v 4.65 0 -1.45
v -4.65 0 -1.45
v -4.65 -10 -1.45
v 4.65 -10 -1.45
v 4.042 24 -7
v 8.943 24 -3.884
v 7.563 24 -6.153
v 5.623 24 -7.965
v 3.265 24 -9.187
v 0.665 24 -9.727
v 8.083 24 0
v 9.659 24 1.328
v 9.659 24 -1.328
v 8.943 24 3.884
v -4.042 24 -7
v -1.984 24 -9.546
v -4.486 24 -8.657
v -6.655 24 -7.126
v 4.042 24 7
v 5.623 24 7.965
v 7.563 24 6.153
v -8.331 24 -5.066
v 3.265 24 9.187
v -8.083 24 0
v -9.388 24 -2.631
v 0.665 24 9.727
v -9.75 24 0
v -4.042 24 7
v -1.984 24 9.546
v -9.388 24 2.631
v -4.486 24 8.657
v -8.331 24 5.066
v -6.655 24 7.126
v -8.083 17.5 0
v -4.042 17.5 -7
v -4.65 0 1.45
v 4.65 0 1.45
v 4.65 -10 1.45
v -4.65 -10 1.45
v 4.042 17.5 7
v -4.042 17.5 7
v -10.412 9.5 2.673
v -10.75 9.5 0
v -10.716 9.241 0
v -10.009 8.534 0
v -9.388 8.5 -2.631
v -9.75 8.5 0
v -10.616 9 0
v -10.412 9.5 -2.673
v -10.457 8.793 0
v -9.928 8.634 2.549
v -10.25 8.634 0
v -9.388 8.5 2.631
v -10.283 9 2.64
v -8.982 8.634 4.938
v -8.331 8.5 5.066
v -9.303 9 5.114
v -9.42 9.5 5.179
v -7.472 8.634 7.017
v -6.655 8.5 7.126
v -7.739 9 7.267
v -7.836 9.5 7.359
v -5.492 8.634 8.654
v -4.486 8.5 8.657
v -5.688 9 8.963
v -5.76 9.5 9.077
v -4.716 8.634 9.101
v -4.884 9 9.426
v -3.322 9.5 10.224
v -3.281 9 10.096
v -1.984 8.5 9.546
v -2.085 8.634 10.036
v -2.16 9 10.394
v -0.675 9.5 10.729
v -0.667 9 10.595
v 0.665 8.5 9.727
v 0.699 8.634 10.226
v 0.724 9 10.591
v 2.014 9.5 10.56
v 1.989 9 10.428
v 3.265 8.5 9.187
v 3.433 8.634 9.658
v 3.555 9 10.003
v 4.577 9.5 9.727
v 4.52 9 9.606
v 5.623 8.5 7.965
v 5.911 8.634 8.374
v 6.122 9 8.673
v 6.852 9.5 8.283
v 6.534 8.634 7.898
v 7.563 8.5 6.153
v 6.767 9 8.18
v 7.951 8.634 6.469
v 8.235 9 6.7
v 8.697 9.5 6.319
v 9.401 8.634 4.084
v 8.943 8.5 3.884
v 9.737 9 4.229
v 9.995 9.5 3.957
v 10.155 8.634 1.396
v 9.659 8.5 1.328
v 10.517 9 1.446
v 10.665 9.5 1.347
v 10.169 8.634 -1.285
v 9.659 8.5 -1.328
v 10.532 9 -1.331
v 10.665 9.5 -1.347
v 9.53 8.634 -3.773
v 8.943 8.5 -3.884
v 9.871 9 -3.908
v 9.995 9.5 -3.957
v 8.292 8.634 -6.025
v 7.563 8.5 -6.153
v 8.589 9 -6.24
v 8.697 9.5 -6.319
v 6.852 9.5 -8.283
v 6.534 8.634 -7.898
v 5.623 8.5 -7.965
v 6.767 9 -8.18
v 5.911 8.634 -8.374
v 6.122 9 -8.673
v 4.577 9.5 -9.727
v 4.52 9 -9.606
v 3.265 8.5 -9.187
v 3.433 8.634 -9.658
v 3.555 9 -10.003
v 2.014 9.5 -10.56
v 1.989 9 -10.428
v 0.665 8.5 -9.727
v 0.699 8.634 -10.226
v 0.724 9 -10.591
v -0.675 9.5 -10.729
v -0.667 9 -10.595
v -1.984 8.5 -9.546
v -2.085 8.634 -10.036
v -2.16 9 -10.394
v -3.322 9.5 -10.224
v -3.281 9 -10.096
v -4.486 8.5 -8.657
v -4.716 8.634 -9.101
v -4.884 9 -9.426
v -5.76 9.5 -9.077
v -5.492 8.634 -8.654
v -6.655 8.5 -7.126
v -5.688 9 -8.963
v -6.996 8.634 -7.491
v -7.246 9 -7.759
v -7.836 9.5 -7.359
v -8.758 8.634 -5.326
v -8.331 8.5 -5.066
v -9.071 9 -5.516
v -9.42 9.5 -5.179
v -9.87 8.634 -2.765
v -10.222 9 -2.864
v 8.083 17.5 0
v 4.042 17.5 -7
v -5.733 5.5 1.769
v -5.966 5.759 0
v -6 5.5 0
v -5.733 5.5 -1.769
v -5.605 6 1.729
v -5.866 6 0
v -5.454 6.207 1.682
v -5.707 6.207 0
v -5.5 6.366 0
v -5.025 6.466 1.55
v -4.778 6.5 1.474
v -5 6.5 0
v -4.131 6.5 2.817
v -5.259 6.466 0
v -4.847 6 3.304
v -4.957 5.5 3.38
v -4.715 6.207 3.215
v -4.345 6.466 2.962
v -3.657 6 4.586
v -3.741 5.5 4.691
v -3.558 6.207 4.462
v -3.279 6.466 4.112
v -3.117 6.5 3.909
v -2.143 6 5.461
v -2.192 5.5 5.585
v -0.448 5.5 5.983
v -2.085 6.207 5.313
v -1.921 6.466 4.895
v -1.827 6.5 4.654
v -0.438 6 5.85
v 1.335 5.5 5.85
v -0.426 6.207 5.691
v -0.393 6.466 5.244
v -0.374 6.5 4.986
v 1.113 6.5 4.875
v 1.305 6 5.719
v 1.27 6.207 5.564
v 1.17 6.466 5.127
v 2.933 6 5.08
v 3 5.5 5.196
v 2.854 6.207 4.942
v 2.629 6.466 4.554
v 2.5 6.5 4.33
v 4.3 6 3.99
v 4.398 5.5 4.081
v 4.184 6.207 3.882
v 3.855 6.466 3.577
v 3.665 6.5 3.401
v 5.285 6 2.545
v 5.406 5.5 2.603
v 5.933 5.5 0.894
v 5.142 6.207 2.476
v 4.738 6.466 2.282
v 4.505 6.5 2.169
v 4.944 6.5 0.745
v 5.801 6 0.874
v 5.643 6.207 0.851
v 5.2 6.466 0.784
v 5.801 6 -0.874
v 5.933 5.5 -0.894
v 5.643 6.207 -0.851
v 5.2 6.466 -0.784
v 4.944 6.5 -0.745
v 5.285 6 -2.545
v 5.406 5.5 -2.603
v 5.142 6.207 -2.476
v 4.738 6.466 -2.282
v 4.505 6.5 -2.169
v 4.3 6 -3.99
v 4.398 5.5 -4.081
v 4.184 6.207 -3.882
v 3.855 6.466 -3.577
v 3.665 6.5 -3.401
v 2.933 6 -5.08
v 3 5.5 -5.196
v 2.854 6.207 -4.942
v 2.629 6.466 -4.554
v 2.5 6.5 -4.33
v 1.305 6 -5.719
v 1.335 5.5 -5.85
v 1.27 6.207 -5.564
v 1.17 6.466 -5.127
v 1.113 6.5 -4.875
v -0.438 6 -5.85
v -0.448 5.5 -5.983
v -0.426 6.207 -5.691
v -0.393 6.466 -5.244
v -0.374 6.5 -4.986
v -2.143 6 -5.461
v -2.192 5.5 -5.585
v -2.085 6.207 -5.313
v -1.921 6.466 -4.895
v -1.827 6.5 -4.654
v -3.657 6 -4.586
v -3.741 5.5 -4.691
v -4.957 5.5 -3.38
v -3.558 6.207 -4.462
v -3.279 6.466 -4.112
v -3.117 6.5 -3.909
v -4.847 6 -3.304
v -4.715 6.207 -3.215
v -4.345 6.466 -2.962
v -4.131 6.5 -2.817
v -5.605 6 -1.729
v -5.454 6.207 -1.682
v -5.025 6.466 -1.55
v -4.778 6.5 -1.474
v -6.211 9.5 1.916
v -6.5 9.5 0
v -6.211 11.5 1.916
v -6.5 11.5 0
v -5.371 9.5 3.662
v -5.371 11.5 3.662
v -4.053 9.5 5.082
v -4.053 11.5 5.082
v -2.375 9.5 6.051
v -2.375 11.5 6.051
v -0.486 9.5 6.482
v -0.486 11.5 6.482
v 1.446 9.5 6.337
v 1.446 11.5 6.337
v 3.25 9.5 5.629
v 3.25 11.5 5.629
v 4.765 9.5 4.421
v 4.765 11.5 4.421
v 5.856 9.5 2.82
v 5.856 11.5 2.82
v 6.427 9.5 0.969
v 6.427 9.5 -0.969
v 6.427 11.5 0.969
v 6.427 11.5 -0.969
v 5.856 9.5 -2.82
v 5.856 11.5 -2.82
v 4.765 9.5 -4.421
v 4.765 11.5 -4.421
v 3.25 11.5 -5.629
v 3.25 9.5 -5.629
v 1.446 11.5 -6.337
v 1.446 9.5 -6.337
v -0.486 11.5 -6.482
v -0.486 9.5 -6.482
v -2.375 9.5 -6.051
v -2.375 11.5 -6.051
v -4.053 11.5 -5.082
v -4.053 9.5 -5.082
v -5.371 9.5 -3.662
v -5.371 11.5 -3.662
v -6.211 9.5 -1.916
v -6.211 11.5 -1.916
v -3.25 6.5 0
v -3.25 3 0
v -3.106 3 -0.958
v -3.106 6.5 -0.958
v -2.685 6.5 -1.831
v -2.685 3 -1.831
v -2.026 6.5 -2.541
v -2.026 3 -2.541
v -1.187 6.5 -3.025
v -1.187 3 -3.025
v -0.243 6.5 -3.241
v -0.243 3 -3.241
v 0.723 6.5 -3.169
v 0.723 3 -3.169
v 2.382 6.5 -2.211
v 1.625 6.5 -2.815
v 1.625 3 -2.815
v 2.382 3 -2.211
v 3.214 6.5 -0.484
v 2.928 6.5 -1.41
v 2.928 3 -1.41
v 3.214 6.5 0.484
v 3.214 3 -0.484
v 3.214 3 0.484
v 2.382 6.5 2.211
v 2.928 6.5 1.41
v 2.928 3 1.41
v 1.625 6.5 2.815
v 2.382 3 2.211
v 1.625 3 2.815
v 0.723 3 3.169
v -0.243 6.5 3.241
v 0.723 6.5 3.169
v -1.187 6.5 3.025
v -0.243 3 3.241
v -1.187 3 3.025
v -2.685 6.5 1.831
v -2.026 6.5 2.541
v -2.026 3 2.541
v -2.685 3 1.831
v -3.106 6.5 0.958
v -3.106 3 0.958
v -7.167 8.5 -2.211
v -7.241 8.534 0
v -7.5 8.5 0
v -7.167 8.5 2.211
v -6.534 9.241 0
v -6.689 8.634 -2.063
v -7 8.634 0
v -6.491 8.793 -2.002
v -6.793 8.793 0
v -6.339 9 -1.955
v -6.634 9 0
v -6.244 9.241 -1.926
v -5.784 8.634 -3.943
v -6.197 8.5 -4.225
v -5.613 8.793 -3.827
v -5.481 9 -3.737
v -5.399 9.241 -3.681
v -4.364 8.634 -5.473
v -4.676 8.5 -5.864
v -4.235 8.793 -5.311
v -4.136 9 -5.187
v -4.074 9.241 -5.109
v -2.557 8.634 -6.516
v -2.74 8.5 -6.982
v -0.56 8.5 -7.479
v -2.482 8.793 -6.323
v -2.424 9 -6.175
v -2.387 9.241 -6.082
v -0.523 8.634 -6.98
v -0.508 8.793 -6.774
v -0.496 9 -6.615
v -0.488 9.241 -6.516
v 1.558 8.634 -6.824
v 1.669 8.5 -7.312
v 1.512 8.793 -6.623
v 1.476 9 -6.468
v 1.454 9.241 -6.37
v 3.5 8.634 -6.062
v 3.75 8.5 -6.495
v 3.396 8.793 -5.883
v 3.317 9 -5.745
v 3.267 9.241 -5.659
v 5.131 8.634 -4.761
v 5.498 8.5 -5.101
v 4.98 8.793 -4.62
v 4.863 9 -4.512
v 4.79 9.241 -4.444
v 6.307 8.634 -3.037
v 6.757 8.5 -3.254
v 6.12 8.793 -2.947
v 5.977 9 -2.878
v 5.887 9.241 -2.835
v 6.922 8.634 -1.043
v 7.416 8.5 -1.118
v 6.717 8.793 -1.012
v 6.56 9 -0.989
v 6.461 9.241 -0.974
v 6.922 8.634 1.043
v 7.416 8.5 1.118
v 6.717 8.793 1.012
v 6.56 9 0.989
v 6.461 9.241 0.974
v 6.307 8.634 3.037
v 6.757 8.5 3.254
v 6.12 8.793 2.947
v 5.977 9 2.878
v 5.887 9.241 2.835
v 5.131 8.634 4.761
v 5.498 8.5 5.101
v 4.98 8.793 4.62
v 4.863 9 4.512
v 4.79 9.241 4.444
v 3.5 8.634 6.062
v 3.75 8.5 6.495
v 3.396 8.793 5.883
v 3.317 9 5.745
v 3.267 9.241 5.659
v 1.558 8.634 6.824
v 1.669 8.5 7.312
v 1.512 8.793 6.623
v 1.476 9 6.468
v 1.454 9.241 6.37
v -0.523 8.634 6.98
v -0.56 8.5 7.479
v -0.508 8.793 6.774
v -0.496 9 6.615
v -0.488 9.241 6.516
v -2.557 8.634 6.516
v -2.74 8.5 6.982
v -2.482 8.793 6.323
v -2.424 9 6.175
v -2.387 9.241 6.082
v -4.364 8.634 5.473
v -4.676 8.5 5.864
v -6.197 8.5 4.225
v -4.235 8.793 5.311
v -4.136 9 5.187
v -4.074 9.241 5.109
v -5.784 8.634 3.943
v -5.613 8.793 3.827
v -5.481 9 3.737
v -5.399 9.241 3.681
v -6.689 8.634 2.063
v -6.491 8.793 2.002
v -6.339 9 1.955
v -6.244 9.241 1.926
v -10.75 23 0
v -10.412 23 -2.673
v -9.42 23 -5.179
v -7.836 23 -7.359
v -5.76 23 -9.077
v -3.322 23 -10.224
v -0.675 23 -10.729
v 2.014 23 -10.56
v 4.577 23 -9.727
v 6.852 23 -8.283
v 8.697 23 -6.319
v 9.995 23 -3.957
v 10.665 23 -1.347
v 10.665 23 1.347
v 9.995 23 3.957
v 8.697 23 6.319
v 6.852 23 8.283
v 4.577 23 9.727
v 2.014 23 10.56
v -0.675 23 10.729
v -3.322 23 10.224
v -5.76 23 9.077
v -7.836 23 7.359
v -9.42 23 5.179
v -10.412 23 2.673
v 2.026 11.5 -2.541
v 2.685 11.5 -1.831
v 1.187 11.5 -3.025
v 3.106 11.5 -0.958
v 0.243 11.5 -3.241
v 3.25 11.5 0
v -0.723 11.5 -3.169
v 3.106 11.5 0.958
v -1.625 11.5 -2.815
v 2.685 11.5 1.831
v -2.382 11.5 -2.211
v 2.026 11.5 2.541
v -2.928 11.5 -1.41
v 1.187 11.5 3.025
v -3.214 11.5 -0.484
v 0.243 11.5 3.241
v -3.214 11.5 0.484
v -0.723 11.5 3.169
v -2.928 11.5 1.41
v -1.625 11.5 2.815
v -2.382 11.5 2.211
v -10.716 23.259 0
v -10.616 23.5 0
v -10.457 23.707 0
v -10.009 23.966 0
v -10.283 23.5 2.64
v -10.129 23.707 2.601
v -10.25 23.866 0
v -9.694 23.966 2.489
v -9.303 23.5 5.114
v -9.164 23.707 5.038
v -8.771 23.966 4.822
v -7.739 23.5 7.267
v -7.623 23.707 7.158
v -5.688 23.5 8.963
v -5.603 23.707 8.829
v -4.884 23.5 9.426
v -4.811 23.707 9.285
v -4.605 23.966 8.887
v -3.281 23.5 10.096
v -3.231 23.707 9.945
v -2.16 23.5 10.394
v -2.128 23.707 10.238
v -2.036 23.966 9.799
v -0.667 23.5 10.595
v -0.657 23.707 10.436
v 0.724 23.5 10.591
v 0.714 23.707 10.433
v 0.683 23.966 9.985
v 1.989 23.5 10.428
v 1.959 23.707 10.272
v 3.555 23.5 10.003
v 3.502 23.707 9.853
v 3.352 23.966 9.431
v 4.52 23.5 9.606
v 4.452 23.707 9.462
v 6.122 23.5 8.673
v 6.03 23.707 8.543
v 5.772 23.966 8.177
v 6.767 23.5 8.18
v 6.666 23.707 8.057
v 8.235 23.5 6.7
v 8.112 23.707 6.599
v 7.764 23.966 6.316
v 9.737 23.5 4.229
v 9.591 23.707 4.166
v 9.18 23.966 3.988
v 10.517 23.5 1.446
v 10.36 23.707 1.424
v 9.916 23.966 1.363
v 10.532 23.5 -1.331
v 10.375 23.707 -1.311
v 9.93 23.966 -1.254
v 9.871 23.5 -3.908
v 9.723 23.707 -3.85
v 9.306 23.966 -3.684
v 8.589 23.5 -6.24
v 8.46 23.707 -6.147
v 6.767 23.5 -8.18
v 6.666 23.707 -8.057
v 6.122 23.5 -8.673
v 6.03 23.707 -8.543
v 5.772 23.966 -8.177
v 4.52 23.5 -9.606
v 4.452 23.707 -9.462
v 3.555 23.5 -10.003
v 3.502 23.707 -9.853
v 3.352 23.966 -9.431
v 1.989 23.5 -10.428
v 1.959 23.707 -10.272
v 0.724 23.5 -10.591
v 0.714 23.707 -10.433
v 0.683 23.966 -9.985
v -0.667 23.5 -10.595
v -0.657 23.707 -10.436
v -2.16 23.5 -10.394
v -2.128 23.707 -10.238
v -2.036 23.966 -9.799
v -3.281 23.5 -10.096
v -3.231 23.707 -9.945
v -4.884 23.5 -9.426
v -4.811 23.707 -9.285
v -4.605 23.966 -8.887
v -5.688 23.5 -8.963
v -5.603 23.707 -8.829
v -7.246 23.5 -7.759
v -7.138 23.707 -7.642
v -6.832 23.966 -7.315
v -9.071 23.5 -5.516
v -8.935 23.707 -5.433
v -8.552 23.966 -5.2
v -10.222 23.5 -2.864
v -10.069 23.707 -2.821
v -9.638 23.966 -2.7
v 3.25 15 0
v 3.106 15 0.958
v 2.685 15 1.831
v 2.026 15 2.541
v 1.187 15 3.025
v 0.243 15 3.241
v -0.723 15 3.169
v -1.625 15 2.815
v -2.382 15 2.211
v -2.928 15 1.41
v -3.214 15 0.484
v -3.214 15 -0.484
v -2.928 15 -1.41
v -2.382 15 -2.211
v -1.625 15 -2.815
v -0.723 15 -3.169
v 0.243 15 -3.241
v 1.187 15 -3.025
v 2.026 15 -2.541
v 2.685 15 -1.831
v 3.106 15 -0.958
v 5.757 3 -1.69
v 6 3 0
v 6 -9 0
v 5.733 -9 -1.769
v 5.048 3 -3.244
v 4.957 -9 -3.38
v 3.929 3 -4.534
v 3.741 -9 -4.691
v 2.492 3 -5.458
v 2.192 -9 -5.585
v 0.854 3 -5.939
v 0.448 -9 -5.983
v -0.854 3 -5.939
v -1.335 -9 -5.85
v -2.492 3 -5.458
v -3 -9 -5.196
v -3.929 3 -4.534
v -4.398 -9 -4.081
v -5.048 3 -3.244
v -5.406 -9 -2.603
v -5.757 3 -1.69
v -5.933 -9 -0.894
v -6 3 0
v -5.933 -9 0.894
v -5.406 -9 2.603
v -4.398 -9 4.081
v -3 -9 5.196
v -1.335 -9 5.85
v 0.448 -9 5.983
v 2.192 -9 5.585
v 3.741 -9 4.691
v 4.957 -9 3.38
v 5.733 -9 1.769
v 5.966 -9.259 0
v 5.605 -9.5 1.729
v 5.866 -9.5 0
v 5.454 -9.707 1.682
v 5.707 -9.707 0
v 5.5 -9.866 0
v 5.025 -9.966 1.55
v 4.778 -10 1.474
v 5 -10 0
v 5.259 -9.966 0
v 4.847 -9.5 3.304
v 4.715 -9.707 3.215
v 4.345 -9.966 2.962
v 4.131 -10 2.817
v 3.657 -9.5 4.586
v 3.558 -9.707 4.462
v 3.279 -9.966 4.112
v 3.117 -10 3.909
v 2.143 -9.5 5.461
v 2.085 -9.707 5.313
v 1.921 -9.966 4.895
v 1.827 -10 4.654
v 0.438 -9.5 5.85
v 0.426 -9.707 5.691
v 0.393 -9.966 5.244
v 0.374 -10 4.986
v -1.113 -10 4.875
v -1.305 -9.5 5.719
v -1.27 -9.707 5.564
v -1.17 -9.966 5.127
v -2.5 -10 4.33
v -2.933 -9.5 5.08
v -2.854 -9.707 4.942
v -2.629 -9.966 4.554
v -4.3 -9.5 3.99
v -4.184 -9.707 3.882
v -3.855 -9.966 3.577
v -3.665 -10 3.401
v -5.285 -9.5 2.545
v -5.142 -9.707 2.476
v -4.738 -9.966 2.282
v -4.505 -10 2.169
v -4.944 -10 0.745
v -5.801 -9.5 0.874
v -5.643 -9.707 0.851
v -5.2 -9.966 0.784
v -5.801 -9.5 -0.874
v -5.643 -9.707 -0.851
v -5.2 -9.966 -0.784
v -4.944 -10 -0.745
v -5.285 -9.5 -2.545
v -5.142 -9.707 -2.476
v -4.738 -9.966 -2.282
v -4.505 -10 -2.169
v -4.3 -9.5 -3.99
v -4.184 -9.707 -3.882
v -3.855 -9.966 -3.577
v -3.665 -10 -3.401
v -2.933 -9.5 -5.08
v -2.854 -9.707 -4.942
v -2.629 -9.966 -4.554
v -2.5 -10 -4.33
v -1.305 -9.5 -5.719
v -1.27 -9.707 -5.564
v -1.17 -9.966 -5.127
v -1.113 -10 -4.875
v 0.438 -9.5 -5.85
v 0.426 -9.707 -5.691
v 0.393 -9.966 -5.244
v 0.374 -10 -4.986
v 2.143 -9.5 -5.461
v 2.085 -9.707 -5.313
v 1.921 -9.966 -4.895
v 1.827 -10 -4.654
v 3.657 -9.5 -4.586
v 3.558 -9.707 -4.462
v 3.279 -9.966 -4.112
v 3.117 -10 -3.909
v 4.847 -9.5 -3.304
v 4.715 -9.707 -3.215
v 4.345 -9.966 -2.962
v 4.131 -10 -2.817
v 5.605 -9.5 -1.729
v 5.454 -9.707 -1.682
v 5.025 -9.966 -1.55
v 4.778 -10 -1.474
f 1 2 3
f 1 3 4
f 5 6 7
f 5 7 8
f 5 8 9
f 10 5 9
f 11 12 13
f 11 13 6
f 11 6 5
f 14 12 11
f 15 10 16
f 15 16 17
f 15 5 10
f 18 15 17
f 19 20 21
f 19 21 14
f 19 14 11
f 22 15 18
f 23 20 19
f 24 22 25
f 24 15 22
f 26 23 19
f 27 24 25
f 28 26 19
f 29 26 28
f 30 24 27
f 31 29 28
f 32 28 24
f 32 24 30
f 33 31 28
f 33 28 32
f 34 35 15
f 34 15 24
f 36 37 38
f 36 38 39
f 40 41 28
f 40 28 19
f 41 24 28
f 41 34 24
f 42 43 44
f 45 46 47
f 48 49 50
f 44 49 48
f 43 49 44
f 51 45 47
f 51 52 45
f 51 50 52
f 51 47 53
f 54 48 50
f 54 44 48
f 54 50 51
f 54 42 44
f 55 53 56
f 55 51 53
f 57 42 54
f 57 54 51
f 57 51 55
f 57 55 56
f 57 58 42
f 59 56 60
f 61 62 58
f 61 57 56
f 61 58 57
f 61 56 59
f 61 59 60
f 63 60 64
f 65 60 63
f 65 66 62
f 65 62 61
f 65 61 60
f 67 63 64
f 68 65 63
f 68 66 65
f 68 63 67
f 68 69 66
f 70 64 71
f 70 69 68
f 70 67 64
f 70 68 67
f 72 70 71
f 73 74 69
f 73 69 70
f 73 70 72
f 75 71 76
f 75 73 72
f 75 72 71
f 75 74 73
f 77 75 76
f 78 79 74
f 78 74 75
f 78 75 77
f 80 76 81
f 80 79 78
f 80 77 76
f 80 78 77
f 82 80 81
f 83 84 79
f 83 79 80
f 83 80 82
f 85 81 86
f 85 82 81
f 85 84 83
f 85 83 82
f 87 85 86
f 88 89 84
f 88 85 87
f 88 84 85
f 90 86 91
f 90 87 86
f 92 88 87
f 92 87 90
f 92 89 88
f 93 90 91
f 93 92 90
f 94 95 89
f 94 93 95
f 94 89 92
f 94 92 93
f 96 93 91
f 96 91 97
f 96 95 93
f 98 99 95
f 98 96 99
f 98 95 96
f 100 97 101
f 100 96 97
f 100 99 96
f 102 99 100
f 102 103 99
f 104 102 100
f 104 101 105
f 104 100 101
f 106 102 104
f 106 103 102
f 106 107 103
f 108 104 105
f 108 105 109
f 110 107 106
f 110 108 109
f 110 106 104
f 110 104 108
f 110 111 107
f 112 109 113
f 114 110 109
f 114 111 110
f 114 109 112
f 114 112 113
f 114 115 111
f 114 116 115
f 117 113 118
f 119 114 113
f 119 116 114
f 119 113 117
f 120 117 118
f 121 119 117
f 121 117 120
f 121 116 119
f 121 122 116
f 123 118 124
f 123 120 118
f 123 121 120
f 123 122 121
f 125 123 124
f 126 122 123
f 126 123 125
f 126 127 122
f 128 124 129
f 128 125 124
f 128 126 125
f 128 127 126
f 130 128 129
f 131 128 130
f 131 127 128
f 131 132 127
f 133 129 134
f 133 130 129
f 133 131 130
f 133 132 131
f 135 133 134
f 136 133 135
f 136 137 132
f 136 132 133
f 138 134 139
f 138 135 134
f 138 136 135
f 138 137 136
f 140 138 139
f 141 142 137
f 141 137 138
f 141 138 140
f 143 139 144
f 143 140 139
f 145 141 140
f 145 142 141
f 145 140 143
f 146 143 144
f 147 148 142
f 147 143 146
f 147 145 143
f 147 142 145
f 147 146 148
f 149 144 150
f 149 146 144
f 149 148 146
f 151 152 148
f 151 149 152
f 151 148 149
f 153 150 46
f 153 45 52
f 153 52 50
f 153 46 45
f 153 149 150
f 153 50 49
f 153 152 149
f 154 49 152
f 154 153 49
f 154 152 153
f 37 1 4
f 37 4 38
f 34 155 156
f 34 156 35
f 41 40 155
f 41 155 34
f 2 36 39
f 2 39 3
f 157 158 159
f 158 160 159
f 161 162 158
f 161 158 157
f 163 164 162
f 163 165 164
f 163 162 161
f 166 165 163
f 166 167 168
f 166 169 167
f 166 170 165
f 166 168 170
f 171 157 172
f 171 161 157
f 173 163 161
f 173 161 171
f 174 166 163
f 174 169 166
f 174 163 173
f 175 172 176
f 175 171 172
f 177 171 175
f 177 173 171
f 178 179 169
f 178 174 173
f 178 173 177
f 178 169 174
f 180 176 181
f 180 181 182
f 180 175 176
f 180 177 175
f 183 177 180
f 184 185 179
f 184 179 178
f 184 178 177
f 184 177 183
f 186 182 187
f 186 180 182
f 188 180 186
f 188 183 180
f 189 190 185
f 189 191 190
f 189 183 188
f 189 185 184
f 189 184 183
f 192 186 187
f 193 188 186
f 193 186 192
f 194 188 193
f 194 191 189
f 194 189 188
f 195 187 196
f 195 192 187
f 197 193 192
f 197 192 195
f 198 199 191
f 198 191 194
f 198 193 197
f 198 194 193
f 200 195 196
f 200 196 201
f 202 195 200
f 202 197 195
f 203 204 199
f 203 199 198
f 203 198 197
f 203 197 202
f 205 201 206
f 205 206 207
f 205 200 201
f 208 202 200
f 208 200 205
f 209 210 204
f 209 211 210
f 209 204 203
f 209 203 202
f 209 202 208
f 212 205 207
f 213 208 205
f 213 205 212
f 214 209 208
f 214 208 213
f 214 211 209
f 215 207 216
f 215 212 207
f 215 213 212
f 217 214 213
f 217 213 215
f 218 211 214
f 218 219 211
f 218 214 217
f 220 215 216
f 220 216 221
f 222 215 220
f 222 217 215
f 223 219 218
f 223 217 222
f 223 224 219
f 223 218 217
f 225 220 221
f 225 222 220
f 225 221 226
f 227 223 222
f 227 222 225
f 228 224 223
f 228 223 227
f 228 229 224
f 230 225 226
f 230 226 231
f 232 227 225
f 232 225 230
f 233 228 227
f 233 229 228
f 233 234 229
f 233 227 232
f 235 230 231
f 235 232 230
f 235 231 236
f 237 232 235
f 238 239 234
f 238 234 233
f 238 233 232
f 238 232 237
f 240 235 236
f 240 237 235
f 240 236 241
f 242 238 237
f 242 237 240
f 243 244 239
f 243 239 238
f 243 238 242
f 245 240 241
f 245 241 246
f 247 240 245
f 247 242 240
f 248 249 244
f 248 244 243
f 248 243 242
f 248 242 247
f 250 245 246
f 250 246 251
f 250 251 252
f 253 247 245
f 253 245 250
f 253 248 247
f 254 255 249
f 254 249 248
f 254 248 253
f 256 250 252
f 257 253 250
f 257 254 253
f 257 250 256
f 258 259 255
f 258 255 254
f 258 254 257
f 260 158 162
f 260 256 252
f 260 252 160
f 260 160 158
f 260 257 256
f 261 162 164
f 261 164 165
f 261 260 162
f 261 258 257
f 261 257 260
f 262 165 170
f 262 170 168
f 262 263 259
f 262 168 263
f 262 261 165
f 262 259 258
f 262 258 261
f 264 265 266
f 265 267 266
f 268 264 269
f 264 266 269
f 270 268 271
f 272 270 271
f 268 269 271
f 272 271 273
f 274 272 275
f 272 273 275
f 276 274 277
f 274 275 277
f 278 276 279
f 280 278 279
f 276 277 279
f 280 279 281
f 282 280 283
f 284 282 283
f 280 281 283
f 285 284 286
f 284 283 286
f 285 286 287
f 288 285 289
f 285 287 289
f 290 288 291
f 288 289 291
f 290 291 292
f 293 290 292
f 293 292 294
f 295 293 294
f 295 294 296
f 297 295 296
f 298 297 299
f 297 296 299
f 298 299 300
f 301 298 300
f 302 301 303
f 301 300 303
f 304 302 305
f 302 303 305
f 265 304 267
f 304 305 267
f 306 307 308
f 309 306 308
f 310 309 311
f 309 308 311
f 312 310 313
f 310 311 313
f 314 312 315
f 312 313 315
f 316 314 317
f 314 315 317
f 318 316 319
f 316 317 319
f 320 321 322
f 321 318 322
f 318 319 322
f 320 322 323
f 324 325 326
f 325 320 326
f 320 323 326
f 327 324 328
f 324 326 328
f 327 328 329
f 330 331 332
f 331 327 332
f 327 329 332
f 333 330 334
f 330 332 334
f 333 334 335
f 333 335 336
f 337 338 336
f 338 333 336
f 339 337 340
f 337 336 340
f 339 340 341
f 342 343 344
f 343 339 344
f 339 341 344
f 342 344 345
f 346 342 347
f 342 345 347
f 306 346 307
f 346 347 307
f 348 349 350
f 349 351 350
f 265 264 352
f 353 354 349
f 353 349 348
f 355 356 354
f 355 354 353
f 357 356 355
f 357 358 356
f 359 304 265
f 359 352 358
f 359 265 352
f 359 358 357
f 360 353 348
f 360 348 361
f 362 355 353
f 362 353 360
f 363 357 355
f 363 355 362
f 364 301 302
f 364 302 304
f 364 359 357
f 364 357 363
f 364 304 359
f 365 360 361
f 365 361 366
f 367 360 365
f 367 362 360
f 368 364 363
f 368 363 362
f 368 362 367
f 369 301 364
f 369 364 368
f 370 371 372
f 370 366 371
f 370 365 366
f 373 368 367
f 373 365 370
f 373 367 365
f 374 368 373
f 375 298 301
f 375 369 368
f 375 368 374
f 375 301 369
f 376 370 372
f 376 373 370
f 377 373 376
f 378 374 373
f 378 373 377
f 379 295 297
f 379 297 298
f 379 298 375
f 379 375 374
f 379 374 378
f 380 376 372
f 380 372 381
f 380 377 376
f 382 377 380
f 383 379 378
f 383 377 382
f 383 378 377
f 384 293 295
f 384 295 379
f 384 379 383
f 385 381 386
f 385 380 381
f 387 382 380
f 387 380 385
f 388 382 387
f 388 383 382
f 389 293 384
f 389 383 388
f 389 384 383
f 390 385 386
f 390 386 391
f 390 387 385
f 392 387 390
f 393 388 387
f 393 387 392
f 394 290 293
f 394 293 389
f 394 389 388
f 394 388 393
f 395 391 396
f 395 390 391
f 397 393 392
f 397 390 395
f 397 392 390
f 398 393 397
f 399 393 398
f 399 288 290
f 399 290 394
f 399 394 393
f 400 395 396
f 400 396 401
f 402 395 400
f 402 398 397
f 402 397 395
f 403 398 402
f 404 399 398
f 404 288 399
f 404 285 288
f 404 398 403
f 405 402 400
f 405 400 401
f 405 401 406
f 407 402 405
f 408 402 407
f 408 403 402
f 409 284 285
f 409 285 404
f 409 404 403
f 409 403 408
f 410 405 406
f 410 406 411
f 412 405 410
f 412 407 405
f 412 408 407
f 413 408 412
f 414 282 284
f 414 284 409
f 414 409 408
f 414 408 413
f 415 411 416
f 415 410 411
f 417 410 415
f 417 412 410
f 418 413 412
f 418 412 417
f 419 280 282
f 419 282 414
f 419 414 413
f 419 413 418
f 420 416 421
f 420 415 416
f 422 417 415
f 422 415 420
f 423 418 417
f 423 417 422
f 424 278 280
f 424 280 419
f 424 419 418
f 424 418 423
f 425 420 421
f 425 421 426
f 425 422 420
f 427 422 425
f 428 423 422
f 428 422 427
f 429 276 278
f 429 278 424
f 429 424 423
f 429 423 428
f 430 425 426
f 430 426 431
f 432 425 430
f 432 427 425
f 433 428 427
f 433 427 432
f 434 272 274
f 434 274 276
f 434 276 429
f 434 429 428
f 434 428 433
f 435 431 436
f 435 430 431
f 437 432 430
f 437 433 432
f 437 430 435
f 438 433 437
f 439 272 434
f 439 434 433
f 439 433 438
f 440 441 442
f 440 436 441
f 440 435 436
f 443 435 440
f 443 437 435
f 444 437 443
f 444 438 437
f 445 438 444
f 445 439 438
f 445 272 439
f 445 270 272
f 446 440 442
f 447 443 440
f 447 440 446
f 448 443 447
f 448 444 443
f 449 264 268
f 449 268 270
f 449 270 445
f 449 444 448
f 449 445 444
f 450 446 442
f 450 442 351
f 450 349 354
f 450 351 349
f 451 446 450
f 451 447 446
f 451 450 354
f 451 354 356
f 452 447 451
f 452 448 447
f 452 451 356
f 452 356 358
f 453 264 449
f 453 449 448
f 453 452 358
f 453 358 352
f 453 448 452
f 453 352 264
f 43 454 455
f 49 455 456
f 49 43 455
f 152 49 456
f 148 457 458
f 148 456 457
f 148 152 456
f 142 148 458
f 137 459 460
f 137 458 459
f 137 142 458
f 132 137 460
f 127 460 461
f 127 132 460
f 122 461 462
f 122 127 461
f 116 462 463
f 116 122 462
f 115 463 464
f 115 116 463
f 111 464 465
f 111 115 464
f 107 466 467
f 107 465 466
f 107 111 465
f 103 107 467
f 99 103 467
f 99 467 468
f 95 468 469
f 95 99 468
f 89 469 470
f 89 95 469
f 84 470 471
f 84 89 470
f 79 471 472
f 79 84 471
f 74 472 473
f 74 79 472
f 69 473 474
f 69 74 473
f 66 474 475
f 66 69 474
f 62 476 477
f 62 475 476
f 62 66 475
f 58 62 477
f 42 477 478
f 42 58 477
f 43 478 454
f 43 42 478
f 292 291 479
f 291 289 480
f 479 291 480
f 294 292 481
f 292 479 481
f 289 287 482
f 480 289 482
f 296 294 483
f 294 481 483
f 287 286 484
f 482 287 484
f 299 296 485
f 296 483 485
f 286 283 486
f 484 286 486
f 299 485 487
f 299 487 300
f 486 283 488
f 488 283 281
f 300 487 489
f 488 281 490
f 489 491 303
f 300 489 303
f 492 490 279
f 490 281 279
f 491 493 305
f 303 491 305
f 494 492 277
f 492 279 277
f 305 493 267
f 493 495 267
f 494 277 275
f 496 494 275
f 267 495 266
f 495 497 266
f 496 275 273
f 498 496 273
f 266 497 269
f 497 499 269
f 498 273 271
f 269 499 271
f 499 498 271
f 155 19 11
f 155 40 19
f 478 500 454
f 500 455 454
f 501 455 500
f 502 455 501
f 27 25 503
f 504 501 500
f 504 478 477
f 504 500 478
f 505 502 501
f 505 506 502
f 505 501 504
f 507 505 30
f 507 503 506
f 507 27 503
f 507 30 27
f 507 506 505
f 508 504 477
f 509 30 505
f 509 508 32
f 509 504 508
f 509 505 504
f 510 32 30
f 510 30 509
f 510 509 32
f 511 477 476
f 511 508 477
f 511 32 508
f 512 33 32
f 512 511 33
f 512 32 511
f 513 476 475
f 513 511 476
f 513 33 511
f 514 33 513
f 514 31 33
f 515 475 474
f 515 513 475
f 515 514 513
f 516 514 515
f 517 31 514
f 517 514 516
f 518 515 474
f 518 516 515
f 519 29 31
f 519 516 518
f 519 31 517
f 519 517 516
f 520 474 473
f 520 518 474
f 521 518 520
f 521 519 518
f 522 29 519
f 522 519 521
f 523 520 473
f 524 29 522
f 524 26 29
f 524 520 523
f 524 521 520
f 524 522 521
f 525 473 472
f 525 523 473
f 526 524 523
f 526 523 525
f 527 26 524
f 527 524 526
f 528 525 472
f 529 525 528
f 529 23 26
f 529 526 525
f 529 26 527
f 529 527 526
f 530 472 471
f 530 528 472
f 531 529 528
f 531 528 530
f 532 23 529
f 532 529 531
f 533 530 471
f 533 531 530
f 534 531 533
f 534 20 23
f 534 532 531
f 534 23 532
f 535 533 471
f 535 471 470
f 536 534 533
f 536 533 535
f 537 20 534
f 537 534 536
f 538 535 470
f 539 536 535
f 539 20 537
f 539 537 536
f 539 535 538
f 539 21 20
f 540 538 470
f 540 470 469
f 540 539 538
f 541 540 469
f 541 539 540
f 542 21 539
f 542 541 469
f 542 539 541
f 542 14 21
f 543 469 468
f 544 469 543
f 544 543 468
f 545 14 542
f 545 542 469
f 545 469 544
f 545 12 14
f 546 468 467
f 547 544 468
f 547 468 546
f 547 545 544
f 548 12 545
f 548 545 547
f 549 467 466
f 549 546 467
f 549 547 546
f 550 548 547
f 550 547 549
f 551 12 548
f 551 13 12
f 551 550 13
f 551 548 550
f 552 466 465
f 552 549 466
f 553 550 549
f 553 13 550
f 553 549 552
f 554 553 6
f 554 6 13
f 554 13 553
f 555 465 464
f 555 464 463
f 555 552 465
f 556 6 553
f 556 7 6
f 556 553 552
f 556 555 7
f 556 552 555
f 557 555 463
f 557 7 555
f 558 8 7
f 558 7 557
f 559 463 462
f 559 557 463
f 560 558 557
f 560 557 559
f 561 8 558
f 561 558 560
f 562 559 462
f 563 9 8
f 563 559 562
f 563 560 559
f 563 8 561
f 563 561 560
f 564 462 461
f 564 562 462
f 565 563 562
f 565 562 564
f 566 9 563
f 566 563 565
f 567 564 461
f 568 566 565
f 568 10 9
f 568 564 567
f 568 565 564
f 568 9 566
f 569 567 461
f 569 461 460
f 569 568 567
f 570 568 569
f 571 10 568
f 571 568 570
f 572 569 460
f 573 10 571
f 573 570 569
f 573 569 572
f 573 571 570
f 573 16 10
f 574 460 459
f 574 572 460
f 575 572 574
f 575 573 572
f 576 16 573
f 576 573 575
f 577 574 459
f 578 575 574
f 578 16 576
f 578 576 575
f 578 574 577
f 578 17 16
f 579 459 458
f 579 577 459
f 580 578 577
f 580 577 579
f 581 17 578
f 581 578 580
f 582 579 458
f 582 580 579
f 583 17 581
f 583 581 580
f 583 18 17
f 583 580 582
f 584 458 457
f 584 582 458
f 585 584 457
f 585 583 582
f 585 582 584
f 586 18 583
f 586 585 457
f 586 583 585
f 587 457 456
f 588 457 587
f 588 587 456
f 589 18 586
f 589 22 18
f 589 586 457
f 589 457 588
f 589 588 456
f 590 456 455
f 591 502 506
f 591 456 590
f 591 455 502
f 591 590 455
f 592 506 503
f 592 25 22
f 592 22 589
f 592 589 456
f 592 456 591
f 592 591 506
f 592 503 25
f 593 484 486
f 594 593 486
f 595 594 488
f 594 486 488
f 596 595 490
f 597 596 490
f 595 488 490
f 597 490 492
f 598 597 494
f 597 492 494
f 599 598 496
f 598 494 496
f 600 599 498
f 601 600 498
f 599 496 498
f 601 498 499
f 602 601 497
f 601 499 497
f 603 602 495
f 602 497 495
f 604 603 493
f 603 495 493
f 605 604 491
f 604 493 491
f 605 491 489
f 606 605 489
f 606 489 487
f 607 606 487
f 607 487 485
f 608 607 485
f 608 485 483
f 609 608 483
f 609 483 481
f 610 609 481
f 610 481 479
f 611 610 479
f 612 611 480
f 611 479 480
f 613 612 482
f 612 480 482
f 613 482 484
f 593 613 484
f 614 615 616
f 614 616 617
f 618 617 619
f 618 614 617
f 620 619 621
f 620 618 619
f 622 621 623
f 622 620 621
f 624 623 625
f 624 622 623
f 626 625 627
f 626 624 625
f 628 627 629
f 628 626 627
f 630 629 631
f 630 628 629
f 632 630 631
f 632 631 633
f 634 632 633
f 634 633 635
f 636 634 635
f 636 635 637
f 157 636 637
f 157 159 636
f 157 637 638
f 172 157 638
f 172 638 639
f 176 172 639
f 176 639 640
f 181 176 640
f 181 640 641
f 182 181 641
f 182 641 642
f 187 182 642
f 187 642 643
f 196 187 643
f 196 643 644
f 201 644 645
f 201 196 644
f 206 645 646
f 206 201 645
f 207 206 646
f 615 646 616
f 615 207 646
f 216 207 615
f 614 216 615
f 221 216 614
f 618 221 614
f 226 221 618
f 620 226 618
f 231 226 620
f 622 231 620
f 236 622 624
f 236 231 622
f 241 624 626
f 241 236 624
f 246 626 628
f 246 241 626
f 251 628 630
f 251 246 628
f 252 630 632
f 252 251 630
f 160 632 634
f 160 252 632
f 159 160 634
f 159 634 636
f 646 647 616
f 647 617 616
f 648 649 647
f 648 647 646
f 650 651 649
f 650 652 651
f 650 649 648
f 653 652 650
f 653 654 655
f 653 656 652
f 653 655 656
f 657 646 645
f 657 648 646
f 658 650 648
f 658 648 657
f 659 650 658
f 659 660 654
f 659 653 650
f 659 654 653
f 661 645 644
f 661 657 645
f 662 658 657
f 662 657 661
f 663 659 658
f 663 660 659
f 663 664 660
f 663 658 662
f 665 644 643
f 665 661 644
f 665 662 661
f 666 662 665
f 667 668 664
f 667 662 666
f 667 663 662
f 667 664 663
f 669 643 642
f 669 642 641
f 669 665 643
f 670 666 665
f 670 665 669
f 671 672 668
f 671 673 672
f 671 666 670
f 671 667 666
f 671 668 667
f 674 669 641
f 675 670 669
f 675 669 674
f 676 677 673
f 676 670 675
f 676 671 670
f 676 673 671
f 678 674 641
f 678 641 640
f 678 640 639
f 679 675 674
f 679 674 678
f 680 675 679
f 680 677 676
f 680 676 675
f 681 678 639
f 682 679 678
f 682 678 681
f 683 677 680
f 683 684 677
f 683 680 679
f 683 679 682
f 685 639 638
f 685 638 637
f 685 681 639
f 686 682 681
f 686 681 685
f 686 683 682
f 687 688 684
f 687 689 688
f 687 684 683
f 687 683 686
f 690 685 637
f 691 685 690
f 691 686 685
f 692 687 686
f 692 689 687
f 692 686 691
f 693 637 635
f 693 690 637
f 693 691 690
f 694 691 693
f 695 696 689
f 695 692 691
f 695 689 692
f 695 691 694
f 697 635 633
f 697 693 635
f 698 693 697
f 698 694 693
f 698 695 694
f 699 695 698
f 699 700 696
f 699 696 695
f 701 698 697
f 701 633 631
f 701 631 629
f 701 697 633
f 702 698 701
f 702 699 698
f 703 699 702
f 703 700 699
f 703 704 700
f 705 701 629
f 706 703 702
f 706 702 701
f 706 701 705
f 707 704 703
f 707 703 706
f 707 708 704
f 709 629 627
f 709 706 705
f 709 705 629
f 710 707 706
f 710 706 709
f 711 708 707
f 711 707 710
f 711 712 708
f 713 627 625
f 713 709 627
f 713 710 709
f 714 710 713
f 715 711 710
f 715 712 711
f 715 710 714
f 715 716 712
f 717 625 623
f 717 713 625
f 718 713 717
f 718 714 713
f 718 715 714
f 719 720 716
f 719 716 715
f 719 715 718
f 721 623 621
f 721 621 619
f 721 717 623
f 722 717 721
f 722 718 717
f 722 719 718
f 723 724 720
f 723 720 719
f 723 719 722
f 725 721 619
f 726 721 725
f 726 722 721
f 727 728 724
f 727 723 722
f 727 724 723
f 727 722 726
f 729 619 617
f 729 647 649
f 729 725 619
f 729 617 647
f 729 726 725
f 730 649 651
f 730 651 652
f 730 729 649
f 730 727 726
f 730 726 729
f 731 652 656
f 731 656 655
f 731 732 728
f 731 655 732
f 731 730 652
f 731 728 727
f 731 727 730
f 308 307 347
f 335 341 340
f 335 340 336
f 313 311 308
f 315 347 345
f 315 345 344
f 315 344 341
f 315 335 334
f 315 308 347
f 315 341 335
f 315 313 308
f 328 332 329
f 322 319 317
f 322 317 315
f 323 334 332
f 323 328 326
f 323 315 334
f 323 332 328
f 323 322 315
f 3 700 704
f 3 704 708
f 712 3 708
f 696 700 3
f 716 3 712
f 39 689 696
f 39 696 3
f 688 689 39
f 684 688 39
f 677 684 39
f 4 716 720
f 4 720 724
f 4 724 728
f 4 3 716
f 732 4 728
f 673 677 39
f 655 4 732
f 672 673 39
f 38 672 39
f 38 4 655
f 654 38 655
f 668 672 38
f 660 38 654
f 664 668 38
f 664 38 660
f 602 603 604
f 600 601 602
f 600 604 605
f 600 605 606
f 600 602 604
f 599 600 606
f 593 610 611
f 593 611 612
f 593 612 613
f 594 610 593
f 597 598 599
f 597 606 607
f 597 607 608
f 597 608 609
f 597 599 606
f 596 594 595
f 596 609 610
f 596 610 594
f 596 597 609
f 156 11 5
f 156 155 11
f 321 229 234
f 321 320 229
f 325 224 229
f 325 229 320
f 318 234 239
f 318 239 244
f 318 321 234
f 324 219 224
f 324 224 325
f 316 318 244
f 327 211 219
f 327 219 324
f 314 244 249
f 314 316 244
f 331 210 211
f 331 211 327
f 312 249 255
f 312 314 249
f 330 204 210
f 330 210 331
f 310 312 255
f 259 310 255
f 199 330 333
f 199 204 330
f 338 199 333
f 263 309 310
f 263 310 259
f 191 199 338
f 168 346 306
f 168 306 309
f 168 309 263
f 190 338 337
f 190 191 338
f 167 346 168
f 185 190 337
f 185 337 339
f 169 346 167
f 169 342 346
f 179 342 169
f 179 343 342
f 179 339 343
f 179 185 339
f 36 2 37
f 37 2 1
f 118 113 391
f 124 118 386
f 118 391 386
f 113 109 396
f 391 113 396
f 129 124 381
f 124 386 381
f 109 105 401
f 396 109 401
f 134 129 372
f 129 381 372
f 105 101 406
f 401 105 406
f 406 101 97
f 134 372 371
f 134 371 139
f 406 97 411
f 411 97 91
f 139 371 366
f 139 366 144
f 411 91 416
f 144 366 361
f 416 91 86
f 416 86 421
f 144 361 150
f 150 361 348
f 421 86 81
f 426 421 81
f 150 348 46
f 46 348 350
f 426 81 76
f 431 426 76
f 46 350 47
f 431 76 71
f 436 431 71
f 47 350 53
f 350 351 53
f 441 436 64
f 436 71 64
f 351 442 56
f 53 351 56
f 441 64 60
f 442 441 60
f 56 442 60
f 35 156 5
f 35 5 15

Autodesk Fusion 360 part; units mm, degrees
sketch "Sketch1" plane through (0, 0, 0) normal (0, 1, 0) x (1, 0, 0) in component "Magnetic_L5_tweezer_connection v1"
  circle A0 centre (0, 0) radius 6
  dimension "d1" = 12
extrude "Extrude1" add sketch "Sketch1" along normal blind 3 makes body 1 in component "Magnetic_L5_tweezer_connection v1"
sketch "Sketch2" plane through (0, 3, 0) normal (0, 1, 0) x (-1, 0, 0) in component "Magnetic_L5_tweezer_connection v1"
  circle A0 centre (0, 0) radius 6
  circle A1 centre (0, 0) radius 3.25
  dimension "d4" = 6.5
extrude "Extrude2" add sketch "Sketch2" along normal blind 3.5 bodies 1 in component "Magnetic_L5_tweezer_connection v1"
sketch "Sketch3" plane through (0, 0, 0) normal (0, -1, 0) x (1, 0, 0) in component "Magnetic_L5_tweezer_connection v1"
  circle A0 centre (0, 0) radius 6
  line L0 (4.65, 1.45) -> (-4.65, 1.45)
  line L1 (-4.65, 1.45) -> (-4.65, -1.45)
  line L2 (-4.65, -1.45) -> (4.65, -1.45)
  line L3 (4.65, -1.45) -> (4.65, 1.45)
  line L4 (4.65, 1.45) -> (-4.65, -1.45) construction
  line L5 (-4.65, 1.45) -> (4.65, -1.45) construction
  dimension "d7" = 2.9
  dimension "d8" = 9.3
extrude "Extrude3" add sketch "Sketch3" along normal blind 10 bodies 1 in component "Magnetic_L5_tweezer_connection v1"
fillet "Fillet1" radius 1 1 edges at (5.594, 6.5, -2.1697) on bodies 1 in component "Magnetic_L5_tweezer_connection v1"
fillet "Fillet2" radius 1 1 edges at (-5.594, -10, -2.1697) on bodies 1 in component "Magnetic_L5_tweezer_connection v1"
sketch "Sketch4" plane through (0, 11.5, 0) normal (0, 1, 0) x (-1, 0, 0) in component "Plunger"
  circle A0 centre (0, 0) radius 3.25
  circle A1 centre (0, 0) radius 6.5
  circle A2 centre (0, 0) radius 10.75
  dimension "d20" = 13
  dimension "d21" = 21.5
extrude "Extrude3'" add sketch "Sketch4" against normal blind 3 separate body contours A2 makes body 2 in component "Plunger"
sketch "Sketch5" plane through (0, 11.5, 0) normal (0, 1, 0) x (-1, 0, 0) in component "Plunger"
  circle A0 centre (0, 0) radius 6.5
  circle A1 centre (0, 0) radius 10.75
  circle A2 centre (0, 0) radius 9.15
extrude "Extrude4" add sketch "Sketch5" along normal blind 6 contours A0 | A1 | A2 bodies 2 in component "Plunger"
sketch "Sketch1 (2)" plane through (0, 11.5, 0) normal (0, -1, 0) x (1, 0, 0) in component "Plunger_only v1"
  circle A0 centre (0, 0) radius 6.5
  circle A1 centre (0, 0) radius 3.25
  dimension "d29" = 6.5
extrude "Extrude6" cut sketch "Sketch1 (2)" against normal blind 3.5 contours A1 bodies 2 in component "Plunger"
sketch "Sketch7" plane through (0, 17.5, 0) normal (0, 1, 0) x (-1, 0, 0) in component "Plunger"
  circle A0 centre (0, 0) radius 10.75
  line L0 (4.0415, -7) -> (8.0829, 0)
  line L1 (8.0829, 0) -> (4.0415, 7)
  line L2 (4.0415, 7) -> (-4.0415, 7)
  line L3 (-4.0415, 7) -> (-8.0829, 0)
  line L4 (-8.0829, 0) -> (-4.0415, -7)
  line L5 (-4.0415, -7) -> (4.0415, -7)
  dimension "d32" = 7
extrude "Extrude7" add sketch "Sketch7" along normal blind 6.5 bodies 2 in component "Plunger"
fillet "Fillet1'" radius 1 1 edges at (6.0601, 8.5, -2.3505) on bodies 2 in component "Plunger"
fillet "Fillet2'" radius 1 1 edges at (10.0225, 8.5, 3.8874) on bodies 2 in component "Plunger"
fillet "Fillet3" radius 1 1 edges at (10.0225, 24, -3.8874) on bodies 2 in component "Plunger"
component "Plunger_only v1" placed x (1, 0, 0) y (0, 1, 0) z (0, 0, 1) at (0, 0, 0)
component "Magnetic_L5_tweezer_connection v1" placed x (1, 0, 0) y (0, 1, 0) z (0, 0, 1) at (0, 0, 0)
component "Plunger" placed x (1, 0, 0) y (0, 1, 0) z (0, 0, 1) at (0, 0, 0) in component "Plunger_only v1"
